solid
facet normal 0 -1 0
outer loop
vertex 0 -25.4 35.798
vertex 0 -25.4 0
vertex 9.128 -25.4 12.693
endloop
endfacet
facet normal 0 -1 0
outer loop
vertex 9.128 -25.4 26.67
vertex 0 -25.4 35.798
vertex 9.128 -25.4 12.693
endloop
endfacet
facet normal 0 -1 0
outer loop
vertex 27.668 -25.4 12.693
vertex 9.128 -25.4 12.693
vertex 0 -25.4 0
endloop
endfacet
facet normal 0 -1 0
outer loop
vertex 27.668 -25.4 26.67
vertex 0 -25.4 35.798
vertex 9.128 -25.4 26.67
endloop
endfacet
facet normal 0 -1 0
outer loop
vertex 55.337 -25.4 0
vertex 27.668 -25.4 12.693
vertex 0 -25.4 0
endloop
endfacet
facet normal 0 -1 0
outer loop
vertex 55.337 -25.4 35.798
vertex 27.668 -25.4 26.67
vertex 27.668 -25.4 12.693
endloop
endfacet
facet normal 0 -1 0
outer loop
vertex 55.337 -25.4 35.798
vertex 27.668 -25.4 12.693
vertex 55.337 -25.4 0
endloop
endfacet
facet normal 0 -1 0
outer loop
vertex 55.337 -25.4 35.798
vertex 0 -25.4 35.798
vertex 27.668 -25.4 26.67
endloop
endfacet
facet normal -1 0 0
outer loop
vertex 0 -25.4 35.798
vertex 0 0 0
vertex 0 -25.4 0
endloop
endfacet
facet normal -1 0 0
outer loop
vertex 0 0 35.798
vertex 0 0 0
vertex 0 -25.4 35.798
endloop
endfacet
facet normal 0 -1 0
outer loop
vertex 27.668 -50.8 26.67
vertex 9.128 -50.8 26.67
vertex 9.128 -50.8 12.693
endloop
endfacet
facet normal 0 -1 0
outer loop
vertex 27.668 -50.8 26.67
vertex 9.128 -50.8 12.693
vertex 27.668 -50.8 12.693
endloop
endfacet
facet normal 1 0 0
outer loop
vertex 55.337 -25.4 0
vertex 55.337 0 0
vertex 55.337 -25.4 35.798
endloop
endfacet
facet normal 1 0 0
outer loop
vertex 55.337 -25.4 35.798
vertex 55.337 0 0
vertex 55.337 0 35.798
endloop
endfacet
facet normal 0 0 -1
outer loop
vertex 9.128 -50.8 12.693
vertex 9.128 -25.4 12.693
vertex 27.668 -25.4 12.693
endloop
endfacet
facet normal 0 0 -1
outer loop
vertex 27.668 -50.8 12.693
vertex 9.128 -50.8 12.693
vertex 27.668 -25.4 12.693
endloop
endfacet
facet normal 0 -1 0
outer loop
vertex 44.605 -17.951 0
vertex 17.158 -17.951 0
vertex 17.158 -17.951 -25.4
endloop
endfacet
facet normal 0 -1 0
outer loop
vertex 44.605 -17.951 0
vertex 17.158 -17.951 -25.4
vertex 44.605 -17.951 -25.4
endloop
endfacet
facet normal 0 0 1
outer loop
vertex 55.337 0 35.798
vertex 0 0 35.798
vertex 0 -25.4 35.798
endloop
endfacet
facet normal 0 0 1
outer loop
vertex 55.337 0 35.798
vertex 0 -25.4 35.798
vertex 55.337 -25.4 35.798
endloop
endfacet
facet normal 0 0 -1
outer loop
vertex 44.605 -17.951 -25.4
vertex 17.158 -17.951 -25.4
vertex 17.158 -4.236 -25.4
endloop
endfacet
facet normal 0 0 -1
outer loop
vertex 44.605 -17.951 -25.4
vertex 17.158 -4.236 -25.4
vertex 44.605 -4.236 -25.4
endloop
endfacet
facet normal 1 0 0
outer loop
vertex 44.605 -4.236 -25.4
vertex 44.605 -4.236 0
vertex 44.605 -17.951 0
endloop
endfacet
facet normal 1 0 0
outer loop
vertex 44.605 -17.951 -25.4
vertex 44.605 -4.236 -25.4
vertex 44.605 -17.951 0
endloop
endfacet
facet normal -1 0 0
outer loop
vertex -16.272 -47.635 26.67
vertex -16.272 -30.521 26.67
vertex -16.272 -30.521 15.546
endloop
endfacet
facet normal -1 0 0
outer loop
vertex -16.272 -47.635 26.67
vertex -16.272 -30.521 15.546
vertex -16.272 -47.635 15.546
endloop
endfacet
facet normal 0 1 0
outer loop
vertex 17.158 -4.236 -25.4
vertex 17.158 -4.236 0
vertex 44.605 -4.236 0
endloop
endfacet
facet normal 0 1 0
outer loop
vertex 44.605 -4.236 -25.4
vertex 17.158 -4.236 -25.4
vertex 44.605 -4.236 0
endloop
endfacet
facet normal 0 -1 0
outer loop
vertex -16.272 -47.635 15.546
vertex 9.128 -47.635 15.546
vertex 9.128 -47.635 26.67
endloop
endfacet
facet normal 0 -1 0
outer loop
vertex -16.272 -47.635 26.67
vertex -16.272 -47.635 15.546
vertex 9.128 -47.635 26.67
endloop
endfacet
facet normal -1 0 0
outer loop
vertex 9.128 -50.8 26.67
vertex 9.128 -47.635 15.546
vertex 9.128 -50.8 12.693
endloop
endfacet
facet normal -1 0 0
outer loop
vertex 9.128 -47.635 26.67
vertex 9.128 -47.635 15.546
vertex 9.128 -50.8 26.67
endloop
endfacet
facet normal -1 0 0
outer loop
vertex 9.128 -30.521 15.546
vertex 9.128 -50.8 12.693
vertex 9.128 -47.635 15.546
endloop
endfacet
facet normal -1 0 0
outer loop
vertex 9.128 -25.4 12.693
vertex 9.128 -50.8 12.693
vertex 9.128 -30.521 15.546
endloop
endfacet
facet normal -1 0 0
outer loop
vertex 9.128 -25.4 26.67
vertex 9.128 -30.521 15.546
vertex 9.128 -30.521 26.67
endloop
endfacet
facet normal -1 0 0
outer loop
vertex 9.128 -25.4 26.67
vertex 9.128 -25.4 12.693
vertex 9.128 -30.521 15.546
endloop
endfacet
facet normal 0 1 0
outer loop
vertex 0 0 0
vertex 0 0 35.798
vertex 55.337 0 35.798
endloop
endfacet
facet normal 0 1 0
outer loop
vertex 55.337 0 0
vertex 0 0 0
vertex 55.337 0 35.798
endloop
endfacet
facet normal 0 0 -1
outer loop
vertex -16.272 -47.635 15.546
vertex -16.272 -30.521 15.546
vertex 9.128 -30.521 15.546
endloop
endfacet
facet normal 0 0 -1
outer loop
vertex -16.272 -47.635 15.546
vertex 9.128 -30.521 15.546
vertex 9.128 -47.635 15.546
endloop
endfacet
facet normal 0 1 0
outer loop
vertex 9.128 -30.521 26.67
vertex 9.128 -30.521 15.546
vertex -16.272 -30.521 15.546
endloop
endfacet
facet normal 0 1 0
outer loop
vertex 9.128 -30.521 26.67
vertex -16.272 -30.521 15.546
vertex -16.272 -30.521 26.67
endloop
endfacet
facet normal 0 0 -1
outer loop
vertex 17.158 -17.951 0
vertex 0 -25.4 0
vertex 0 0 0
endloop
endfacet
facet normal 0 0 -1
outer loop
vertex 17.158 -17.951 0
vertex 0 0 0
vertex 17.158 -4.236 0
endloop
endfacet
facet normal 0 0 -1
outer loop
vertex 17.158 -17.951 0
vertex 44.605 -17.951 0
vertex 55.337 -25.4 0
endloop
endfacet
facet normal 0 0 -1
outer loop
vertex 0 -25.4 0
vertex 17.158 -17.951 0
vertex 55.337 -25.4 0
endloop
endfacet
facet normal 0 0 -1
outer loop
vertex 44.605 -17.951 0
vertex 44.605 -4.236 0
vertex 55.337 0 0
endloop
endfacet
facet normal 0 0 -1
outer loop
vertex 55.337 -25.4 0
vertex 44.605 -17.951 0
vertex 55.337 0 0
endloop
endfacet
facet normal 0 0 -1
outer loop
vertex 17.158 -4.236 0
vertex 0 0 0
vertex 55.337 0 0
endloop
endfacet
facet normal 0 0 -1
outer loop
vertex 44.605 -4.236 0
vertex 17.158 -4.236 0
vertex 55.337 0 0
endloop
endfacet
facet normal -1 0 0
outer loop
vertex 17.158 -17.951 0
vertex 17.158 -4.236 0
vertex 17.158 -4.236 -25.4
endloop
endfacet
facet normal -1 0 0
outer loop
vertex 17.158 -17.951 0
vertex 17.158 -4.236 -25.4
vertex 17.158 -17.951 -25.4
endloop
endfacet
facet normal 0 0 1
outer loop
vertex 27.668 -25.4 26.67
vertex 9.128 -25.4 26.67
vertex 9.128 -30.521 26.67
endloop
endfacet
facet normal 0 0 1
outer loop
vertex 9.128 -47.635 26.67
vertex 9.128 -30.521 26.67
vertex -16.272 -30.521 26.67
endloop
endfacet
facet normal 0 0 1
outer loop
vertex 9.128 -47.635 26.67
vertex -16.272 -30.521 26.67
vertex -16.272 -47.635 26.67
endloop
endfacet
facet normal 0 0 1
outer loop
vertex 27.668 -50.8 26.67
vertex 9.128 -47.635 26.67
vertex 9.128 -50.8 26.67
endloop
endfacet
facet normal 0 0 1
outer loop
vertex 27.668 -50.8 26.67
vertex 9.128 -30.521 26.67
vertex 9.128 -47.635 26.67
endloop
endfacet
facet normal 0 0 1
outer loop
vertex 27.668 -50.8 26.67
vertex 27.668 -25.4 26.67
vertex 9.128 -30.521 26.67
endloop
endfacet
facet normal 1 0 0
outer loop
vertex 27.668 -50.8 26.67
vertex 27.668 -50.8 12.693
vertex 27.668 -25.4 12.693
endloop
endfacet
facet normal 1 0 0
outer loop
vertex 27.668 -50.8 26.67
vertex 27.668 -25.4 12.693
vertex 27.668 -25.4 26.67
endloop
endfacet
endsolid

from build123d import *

# Parameters (mm, degrees)
F0_W     = 55.336684
F0_H     = 35.7977
F1_DEPTH = 25.4
F2_W     = 18.540639
F2_H     = 13.976792
F3_DEPTH = 25.4
F4_W     = 17.11444
F4_H     = 11.124386
F5_DEPTH = 25.4
F6_W     = 27.447399
F6_H     = 13.715297
F7_DEPTH = 25.4


with BuildPart() as f1:
    # F0 (on Front) → F1 (new body)
    with BuildSketch(Plane.XZ):
        with Locations((27.668342, 17.89885)):
            Rectangle(F0_W, F0_H)
    extrude(amount=F1_DEPTH)

    # F2 (on face) → F3 (join)
    with BuildSketch(Plane.XZ.offset(25.4)):
        with Locations((18.39802, 19.681605)):
            Rectangle(F2_W, F2_H)
    extrude(amount=F3_DEPTH)

    # F4 (on face) → F5 (join)
    with BuildSketch(Plane(origin=(9.127701, 0, 0), x_dir=(0, -1, 0), z_dir=(-1, 0, 0))):
        with Locations((39.077966, 21.107808)):
            Rectangle(F4_W, F4_H)
    extrude(amount=F5_DEPTH)

    # F6 (on face) → F7 (join)
    with BuildSketch(Plane(origin=(0, 0, 0), x_dir=(1, 0, 0), z_dir=(0, 0, -1))):
        with Locations((30.881432, 11.093259)):
            Rectangle(F6_W, F6_H)
    extrude(amount=F7_DEPTH)


solid = f1.part
